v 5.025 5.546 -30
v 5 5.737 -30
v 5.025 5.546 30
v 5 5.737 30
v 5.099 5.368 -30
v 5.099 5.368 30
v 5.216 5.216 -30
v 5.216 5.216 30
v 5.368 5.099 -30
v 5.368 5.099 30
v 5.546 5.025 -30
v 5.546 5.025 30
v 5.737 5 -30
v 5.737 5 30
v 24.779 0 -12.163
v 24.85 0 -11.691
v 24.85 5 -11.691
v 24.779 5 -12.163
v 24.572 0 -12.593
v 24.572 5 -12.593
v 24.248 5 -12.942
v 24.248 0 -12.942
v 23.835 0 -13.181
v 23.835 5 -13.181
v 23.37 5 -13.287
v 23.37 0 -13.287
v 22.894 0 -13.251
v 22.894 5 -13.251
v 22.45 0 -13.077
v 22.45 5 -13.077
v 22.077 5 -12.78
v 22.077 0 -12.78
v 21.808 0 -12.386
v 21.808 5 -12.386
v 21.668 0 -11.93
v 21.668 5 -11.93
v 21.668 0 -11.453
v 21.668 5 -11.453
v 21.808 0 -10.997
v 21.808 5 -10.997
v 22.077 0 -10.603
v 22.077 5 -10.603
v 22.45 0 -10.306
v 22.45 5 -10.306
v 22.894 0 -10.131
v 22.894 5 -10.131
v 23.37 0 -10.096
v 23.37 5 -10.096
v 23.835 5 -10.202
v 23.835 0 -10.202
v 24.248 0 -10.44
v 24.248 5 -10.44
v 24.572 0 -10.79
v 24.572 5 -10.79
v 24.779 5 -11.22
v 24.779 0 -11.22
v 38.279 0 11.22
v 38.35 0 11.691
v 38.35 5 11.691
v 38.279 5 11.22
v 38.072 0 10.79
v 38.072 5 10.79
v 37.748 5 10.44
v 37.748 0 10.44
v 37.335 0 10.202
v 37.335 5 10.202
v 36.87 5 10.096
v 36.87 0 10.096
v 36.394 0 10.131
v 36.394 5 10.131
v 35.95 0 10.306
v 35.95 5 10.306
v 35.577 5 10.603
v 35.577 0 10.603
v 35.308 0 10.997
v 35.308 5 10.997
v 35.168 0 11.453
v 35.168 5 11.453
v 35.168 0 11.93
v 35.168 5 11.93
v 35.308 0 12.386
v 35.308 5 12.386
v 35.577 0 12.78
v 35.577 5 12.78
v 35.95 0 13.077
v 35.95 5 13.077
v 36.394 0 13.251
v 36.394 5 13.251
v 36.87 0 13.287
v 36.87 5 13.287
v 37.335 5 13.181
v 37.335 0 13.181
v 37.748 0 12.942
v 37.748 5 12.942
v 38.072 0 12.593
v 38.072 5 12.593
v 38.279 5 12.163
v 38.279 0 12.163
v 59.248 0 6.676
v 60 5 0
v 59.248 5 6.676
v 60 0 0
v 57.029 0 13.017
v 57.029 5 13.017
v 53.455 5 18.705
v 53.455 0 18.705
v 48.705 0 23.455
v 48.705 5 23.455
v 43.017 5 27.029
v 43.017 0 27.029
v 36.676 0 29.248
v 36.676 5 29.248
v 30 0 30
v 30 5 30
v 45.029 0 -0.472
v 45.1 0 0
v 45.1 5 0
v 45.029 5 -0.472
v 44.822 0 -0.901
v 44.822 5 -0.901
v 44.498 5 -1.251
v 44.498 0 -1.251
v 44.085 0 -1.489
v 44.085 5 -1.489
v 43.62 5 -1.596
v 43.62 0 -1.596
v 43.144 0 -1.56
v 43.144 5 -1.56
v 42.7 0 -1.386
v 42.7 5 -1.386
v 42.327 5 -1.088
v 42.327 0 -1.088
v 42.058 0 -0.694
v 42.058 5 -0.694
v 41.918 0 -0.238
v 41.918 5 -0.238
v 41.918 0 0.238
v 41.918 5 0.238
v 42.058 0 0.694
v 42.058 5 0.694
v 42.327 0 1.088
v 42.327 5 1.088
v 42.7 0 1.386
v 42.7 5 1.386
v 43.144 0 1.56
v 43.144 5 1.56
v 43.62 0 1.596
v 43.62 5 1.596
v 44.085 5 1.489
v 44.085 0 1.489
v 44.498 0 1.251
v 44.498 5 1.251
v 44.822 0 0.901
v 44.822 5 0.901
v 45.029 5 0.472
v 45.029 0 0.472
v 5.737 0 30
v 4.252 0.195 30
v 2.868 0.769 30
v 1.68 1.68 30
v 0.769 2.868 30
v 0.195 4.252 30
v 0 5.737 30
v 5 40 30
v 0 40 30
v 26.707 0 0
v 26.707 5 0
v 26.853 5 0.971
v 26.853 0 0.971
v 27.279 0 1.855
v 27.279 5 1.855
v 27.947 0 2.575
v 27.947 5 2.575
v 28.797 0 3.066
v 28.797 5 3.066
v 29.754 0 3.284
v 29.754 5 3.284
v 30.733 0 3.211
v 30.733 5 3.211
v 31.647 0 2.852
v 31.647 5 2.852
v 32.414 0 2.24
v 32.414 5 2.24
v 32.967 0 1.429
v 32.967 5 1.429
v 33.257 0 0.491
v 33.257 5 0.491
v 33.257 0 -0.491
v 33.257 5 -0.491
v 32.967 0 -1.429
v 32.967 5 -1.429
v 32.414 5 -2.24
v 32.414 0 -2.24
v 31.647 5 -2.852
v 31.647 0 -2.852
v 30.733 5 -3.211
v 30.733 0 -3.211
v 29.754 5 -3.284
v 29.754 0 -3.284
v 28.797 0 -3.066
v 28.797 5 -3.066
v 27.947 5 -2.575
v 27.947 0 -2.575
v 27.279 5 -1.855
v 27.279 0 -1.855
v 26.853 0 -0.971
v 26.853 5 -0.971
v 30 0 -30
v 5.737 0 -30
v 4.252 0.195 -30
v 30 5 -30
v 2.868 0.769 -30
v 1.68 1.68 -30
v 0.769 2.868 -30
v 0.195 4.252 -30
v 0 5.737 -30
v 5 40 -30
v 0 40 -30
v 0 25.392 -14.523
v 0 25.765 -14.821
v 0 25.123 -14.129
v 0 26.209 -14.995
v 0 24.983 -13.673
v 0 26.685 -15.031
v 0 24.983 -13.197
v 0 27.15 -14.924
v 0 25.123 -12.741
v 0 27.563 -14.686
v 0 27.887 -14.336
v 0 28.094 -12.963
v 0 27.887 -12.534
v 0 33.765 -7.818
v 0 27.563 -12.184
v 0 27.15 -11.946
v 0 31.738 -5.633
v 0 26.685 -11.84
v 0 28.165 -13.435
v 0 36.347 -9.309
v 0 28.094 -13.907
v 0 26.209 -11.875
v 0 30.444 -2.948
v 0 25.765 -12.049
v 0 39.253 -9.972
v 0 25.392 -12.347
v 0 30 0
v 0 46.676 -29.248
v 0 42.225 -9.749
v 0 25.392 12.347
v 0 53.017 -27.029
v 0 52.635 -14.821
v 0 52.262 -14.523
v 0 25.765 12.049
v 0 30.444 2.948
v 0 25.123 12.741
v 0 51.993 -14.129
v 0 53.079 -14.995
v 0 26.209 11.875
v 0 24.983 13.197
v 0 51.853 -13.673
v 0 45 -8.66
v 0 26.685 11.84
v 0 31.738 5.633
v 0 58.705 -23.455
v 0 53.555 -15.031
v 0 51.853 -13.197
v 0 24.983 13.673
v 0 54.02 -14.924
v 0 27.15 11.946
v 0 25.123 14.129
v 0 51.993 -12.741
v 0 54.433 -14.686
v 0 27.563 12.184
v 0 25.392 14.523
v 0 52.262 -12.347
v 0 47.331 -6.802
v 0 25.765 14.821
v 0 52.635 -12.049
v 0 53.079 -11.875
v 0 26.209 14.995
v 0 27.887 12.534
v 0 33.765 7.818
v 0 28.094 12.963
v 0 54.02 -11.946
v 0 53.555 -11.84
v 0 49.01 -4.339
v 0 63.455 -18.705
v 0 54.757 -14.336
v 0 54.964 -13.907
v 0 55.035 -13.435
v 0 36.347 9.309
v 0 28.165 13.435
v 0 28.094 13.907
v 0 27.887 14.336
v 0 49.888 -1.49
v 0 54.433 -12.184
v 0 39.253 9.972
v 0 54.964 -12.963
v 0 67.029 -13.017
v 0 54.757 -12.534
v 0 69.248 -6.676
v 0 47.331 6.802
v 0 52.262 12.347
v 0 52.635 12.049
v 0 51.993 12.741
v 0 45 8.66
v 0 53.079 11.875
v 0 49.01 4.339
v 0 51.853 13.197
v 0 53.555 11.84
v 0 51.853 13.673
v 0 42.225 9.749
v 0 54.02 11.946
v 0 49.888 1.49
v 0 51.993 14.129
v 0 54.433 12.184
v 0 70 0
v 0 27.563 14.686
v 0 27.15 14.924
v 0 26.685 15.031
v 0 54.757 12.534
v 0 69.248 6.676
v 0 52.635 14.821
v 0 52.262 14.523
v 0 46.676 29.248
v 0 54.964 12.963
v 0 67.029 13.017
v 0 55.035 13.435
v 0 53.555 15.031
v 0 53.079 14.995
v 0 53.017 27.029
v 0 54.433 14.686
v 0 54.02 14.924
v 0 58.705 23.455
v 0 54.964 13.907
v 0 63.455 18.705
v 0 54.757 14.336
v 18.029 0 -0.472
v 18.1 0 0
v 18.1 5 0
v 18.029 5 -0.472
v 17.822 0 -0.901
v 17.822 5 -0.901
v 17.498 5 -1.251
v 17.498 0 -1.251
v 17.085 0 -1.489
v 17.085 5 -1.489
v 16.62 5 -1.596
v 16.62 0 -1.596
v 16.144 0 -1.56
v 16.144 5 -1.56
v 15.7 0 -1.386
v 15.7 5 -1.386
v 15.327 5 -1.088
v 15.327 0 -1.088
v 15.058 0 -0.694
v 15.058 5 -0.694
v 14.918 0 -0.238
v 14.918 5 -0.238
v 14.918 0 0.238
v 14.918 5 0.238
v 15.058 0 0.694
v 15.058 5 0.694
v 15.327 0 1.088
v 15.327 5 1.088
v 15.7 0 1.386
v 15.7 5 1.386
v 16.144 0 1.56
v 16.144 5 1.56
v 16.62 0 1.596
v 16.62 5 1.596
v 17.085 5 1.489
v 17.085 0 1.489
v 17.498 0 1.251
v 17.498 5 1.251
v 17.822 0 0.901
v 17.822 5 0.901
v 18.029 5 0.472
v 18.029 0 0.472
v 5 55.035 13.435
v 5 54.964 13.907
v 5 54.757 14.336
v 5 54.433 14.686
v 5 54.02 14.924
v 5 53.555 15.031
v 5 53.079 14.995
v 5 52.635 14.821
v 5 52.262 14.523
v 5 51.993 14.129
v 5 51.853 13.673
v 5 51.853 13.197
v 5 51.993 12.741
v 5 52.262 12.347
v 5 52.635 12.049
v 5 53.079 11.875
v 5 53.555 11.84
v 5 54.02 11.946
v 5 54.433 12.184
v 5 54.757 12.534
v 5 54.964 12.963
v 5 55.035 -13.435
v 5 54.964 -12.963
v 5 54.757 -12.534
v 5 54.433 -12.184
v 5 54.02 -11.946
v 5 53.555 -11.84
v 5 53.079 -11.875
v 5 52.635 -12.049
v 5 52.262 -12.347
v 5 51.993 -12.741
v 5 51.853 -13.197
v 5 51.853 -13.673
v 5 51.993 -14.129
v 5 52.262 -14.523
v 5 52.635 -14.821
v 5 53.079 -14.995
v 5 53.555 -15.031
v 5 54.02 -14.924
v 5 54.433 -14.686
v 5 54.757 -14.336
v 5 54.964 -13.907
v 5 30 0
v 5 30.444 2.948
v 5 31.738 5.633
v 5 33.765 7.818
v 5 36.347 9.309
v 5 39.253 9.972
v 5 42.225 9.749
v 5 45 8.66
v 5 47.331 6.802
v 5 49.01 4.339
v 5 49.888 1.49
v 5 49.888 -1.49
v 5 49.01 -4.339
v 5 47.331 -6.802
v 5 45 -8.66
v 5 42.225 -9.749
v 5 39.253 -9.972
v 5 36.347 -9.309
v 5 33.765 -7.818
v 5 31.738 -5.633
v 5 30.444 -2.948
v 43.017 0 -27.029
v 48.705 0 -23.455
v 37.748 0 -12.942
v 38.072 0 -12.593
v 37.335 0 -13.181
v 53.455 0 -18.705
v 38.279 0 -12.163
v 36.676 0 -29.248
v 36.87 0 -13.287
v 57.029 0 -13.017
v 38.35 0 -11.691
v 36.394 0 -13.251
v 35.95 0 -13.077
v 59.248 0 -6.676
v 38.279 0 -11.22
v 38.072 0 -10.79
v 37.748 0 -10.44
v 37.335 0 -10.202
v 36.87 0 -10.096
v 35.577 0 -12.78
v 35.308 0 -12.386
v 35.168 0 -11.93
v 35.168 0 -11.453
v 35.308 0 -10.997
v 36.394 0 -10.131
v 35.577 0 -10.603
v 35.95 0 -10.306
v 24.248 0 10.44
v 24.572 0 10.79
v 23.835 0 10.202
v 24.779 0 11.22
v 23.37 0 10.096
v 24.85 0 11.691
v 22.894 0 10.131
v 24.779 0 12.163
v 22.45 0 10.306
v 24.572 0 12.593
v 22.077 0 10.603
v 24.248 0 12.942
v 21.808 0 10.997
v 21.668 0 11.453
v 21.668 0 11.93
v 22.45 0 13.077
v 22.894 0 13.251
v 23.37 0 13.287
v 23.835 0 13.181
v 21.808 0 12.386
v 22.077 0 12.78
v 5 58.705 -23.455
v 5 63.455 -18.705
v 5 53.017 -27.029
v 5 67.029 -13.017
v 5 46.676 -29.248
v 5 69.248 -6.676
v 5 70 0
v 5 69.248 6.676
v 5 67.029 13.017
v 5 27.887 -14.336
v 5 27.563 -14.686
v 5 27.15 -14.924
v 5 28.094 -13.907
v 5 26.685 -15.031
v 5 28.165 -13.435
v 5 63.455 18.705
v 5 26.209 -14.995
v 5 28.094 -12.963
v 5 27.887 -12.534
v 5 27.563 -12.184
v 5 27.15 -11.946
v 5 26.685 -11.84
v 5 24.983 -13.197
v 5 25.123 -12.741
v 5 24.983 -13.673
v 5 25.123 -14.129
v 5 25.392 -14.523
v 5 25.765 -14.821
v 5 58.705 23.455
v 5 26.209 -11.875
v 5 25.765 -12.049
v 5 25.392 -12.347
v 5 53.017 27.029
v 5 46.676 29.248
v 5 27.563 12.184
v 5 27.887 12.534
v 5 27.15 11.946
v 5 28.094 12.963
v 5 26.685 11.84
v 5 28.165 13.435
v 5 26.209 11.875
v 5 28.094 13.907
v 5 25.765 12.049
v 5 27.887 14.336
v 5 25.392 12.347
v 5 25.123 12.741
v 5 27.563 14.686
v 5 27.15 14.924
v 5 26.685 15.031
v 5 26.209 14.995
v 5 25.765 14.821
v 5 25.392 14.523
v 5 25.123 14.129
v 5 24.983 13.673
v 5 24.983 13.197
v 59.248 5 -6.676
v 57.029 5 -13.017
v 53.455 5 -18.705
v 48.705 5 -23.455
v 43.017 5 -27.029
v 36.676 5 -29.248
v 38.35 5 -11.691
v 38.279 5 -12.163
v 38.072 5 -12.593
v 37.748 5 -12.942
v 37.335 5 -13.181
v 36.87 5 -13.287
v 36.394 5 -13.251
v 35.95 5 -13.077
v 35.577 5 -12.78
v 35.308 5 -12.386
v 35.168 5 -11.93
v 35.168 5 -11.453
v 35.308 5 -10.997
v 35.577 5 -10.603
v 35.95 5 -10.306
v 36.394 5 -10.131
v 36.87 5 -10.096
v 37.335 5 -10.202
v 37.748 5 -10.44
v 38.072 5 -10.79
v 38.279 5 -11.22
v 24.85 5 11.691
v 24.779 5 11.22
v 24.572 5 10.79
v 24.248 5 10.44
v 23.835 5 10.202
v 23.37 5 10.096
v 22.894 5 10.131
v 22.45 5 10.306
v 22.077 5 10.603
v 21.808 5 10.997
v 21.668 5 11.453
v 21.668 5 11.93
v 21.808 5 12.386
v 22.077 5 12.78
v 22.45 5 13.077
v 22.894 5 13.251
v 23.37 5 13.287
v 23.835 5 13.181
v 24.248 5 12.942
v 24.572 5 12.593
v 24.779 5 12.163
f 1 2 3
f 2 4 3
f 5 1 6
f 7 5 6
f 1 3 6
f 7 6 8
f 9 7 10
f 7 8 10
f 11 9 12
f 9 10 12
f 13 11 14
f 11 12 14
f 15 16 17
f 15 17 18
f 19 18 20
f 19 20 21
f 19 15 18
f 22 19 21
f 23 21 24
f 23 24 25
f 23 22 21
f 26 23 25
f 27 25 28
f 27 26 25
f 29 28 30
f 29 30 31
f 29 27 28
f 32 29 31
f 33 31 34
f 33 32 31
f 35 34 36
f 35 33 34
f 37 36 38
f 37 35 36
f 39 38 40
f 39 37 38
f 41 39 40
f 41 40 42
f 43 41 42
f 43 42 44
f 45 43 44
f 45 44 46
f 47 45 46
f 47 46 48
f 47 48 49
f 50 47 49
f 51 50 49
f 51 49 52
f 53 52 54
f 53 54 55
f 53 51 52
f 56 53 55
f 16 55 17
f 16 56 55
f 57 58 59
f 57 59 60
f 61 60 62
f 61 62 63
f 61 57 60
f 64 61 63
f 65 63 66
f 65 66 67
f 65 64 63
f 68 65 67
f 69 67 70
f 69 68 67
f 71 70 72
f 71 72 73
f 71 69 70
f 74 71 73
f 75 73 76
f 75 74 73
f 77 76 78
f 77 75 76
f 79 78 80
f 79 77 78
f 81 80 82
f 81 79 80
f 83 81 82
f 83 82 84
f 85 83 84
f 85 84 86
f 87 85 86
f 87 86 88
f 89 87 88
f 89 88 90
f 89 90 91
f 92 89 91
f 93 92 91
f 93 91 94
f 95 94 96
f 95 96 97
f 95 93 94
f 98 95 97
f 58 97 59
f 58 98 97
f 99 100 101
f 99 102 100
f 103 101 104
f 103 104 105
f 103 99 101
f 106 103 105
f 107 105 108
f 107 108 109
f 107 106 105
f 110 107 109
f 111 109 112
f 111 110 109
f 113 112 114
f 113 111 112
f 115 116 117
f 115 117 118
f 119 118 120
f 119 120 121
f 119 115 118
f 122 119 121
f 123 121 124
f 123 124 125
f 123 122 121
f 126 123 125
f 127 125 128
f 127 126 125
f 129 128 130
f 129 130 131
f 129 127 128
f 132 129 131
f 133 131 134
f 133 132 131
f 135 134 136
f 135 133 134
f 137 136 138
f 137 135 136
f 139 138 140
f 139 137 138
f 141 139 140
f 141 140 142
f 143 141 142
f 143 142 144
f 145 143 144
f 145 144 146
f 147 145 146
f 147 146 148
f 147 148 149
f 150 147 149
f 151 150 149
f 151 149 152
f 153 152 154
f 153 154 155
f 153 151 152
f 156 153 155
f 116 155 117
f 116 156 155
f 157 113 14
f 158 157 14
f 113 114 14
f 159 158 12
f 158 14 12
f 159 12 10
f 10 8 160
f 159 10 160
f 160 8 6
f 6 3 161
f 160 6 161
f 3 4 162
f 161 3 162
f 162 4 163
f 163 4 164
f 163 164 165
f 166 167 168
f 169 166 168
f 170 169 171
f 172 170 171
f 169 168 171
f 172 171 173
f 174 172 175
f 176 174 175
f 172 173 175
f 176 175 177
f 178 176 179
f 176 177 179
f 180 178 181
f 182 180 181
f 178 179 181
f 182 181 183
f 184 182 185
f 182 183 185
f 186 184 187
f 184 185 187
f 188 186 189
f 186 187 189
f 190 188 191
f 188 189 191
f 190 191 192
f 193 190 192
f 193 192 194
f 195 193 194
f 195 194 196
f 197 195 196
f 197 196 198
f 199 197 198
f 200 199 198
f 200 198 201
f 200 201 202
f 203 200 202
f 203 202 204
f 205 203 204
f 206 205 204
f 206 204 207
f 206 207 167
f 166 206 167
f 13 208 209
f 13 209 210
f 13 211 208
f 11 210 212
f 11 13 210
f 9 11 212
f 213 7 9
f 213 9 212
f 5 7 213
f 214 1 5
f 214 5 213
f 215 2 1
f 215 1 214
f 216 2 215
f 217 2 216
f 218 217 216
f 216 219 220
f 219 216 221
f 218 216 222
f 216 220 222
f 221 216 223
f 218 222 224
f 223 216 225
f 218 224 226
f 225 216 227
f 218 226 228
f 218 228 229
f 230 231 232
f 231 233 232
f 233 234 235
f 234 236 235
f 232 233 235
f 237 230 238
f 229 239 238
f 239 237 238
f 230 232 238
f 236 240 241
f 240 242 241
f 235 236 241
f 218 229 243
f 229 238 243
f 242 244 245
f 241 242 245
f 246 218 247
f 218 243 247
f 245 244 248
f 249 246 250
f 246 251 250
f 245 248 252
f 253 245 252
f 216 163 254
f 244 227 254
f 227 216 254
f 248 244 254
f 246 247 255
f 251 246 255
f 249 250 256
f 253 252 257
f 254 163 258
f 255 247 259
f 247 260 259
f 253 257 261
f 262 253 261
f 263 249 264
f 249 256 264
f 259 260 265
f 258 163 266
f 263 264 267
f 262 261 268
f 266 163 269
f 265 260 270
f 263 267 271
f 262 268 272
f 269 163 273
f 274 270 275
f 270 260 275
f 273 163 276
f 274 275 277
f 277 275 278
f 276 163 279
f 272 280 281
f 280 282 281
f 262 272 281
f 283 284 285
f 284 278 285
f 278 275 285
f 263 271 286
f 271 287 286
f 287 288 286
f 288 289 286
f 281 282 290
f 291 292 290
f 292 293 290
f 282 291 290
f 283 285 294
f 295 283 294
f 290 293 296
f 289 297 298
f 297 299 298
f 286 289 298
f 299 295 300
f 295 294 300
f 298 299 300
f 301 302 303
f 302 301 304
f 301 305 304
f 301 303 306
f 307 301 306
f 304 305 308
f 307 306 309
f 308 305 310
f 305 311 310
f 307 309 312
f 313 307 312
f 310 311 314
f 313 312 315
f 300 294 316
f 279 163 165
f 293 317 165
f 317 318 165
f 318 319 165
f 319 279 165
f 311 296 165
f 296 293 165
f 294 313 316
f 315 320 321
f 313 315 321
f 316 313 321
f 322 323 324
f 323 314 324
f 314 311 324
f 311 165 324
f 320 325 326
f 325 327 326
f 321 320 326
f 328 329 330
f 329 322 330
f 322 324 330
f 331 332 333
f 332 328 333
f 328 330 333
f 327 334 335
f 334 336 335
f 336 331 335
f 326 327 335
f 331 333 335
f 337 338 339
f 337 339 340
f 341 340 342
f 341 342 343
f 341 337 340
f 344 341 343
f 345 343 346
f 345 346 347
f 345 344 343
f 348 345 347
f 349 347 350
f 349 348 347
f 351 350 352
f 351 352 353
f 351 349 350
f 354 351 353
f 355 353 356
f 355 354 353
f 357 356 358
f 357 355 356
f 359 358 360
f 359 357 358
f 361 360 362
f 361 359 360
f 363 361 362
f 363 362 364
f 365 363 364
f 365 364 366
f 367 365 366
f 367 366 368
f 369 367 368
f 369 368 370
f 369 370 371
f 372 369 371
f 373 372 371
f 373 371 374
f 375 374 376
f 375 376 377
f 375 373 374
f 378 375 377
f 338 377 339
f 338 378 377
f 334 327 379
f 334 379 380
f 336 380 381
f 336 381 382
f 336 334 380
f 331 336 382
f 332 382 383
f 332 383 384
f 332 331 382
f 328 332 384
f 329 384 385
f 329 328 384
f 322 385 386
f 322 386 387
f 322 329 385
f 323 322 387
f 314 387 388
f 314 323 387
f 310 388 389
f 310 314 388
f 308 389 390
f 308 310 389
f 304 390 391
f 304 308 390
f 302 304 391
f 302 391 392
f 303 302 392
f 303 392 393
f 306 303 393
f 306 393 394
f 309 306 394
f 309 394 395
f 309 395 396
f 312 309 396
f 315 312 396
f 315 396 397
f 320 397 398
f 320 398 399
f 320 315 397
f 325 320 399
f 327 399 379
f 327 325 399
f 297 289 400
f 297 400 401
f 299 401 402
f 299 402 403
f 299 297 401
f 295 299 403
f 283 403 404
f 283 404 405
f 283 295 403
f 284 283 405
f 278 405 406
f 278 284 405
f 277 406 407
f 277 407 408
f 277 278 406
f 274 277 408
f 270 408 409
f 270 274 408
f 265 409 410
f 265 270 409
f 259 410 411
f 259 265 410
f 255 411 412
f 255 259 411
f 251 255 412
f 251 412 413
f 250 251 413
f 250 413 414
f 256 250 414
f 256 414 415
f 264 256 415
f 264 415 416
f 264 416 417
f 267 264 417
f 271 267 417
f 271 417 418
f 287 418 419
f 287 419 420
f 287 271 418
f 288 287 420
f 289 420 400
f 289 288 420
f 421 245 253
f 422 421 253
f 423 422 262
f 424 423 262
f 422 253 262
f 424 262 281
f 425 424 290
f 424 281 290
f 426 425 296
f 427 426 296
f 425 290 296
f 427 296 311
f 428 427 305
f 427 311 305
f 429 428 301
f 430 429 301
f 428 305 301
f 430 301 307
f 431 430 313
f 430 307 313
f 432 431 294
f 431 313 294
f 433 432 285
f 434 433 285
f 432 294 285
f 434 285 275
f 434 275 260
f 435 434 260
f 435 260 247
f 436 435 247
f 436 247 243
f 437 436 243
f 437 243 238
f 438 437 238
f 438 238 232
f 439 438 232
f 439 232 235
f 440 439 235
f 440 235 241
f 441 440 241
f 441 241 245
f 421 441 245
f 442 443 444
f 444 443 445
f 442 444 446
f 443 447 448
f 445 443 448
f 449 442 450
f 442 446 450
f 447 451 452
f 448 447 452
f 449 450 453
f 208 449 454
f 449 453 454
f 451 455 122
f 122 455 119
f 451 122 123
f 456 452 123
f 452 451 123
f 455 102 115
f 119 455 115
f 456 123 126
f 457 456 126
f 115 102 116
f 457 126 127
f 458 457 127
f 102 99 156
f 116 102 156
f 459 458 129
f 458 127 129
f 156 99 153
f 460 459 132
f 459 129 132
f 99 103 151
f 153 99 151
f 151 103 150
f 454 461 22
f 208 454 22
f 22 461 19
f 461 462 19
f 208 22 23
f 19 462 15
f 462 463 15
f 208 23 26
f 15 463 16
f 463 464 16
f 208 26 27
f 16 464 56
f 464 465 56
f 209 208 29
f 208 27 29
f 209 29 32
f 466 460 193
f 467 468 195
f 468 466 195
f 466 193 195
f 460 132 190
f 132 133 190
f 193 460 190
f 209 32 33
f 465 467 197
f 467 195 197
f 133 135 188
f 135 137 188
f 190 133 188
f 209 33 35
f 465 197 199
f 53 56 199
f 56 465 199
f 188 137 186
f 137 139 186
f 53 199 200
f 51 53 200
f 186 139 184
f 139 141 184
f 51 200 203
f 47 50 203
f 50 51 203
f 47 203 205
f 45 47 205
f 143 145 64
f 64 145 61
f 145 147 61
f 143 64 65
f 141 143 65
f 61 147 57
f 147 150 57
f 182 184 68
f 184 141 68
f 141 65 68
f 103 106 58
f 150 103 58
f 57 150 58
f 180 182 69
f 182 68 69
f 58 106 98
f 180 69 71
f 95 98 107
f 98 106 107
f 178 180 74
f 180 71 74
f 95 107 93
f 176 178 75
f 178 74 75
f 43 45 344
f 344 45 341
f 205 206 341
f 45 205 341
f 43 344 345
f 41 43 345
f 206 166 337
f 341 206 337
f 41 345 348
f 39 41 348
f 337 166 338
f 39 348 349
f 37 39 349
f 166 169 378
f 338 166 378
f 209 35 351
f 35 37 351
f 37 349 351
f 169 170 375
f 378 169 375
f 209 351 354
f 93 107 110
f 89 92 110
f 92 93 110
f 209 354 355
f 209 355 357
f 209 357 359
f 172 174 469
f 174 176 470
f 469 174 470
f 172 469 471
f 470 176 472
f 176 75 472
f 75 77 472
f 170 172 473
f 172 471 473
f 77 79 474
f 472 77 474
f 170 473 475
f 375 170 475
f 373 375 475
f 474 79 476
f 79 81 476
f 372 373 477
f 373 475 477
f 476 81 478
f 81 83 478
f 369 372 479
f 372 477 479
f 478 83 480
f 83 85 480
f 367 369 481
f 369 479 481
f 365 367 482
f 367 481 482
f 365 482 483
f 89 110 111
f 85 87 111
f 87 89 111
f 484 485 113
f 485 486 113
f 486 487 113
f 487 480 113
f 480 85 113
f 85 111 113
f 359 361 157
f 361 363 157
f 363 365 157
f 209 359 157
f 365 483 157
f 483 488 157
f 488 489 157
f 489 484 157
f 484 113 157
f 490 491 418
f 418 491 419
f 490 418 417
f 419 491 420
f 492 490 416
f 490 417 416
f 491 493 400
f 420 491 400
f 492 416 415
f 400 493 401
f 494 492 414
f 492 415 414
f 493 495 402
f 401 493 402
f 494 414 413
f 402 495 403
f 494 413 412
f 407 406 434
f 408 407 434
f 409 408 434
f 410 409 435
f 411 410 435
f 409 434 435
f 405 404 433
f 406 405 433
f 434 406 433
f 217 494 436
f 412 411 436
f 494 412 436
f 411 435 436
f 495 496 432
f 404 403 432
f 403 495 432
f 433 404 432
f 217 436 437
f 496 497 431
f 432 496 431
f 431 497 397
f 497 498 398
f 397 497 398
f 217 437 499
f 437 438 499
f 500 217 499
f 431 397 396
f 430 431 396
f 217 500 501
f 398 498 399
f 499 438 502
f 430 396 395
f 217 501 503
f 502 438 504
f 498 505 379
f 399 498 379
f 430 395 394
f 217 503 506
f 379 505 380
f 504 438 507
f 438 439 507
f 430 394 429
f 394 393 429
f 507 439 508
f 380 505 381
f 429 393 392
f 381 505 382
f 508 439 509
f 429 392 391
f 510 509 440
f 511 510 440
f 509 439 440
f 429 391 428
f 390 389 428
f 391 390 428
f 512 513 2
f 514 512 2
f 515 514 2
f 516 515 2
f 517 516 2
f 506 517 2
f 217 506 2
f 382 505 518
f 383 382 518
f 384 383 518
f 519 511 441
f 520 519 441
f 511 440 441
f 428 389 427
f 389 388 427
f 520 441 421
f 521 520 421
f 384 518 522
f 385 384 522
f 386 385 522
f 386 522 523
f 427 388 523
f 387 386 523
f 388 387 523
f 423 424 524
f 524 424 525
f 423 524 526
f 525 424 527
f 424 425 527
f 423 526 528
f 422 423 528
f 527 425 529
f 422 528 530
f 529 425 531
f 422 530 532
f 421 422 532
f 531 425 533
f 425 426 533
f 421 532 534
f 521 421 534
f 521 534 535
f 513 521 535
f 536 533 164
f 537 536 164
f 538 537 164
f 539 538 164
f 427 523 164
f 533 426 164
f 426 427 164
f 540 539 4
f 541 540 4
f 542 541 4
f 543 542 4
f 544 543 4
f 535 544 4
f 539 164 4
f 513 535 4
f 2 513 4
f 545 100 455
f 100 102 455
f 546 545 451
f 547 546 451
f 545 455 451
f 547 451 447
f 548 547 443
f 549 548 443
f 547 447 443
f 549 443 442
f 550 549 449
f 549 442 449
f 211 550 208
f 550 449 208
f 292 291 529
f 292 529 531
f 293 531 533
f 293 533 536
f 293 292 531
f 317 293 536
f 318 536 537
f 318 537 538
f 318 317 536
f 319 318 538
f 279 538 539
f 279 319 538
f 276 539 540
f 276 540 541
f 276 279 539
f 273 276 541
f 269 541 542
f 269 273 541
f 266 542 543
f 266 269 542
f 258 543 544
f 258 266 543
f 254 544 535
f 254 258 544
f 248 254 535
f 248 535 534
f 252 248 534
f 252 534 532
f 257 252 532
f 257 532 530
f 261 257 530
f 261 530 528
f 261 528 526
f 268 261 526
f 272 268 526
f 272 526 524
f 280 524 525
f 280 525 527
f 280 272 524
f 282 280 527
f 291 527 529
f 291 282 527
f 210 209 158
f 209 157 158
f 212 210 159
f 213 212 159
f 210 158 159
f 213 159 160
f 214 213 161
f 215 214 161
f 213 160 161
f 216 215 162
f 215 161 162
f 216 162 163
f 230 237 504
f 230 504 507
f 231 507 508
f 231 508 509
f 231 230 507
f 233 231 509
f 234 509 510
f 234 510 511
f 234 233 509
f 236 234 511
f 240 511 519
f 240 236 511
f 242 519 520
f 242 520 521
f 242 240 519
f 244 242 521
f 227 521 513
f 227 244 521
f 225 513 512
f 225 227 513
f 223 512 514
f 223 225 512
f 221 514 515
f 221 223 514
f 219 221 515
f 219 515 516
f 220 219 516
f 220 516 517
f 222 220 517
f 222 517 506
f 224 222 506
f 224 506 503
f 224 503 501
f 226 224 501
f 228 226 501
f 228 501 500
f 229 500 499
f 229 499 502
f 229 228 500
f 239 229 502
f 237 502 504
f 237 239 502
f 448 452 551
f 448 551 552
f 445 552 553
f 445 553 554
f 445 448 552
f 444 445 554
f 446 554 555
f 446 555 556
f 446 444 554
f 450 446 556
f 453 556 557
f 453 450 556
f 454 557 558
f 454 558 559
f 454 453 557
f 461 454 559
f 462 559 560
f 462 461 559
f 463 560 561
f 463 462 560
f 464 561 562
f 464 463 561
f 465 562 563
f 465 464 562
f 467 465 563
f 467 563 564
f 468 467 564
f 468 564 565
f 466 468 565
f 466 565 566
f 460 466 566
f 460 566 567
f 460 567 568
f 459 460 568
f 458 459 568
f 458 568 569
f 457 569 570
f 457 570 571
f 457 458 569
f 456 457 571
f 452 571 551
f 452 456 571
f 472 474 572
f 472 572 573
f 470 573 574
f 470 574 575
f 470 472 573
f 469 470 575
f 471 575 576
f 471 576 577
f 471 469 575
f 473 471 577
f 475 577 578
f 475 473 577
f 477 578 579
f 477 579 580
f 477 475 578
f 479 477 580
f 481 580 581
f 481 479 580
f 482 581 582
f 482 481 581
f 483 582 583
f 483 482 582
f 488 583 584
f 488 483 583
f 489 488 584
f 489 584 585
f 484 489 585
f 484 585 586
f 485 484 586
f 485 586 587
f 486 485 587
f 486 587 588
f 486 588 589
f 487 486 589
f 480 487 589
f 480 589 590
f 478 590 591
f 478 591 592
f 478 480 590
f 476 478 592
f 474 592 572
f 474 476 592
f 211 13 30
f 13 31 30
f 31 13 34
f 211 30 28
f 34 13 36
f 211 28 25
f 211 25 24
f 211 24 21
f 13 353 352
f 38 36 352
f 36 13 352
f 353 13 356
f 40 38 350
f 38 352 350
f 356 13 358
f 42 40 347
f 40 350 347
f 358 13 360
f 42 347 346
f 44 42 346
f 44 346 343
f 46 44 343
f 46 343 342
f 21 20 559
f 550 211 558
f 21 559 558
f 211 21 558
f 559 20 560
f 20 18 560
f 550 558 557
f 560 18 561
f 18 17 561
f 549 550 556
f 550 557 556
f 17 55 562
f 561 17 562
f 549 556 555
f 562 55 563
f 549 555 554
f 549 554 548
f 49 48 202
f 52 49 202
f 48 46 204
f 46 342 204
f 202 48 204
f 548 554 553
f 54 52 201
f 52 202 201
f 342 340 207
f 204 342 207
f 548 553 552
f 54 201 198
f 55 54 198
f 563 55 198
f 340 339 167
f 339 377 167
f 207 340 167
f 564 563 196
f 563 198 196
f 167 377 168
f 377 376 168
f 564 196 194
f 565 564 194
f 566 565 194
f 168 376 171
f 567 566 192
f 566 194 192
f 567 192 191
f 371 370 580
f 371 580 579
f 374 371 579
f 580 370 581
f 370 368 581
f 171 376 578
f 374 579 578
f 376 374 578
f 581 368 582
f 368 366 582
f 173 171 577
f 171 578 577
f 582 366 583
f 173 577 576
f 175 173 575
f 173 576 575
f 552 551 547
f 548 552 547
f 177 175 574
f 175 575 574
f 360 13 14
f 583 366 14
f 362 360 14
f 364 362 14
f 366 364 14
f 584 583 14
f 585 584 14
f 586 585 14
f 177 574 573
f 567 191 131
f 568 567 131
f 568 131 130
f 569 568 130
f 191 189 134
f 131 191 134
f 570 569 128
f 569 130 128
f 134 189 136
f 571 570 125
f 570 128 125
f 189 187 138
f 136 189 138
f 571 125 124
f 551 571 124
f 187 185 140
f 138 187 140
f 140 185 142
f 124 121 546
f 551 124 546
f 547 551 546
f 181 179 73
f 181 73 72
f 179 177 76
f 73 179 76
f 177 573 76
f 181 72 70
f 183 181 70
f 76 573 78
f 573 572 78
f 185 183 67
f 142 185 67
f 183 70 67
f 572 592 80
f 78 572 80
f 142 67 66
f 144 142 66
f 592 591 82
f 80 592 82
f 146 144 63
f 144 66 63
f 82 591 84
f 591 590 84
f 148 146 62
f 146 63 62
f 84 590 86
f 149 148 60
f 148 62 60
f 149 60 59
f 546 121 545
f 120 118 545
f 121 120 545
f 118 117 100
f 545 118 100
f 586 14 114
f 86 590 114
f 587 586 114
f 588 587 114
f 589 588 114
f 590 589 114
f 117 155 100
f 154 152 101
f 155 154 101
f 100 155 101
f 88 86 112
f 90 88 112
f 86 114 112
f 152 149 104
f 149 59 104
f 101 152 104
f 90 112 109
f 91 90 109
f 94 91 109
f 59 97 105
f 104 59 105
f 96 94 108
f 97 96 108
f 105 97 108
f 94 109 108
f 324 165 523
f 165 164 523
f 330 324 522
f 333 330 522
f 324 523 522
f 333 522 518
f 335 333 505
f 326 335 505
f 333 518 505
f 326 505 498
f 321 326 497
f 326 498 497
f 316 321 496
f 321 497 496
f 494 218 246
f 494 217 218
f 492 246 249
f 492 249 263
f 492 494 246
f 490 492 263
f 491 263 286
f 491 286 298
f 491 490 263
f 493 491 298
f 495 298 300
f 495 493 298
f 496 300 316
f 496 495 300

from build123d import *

# Parameters (mm, degrees)
SM_BASE_FLANGE_1_DEPTH  = 30
SKETCH_2_R              = 3.293373228
CUT_EXTRUDE_1_DEPTH     = 10
HOLE_WIZARD_1_OUTLINE_R = 1.6
HOLE_WIZARD_1_DEPTH     = 5
SKETCH_5_R              = 10
CUT_EXTRUDE_2_DEPTH     = 10
HOLE_WIZARD_2_OUTLINE_R = 1.6
HOLE_WIZARD_2_DEPTH     = 5
FILLET_1_R              = 30


# Read off the part's stored shape, not the designer's step: 孔1, 孔2
# Sheet-metal steps are written as plain solids
with BuildPart() as part:
    # Sketch 1 → 基体-法兰1 (new, symmetric)
    with BuildSketch(Plane.XY):
        with BuildLine():
            Line((60, 0), (5.7366, 0))
            ThreePointArc((5.7366, 0), (1.680211239, 1.680211239), (0, 5.7366))
            Line((0, 5.7366), (0, 70))
            Line((0, 70), (5, 70))
            Line((5, 70), (5, 5.7366))
            ThreePointArc((5, 5.7366), (5.215745145, 5.215745145), (5.7366, 5))
            Line((5.7366, 5), (60, 5))
            Line((60, 5), (60, 0))
        make_face()
    extrude(amount=SM_BASE_FLANGE_1_DEPTH, both=True)

    # Sketch 2 → 切除-拉伸1 (cut)
    with BuildSketch(Plane(origin=(0, 5, 0), x_dir=(1, 0, 0), z_dir=(0, 1, 0))):
        with Locations(Location((30, 0, 0), (0, 0, 180))):
            Circle(SKETCH_2_R)
    extrude(amount=-CUT_EXTRUDE_1_DEPTH, mode=Mode.SUBTRACT)

    # 孔1 outline → 孔1 (cut)
    with BuildSketch(Plane(origin=(0, 0, 0), x_dir=(1, 0, 0), z_dir=(0, 1, 0))):
        with Locations((23.25, -11.691342951)):
            Circle(HOLE_WIZARD_1_OUTLINE_R)
        with Locations((16.5, 0)):
            Circle(HOLE_WIZARD_1_OUTLINE_R)
        with Locations((23.25, 11.691342951)):
            Circle(HOLE_WIZARD_1_OUTLINE_R)
        with Locations((36.75, 11.691342951)):
            Circle(HOLE_WIZARD_1_OUTLINE_R)
        with Locations((43.5, 0)):
            Circle(HOLE_WIZARD_1_OUTLINE_R)
        with Locations((36.75, -11.691342951)):
            Circle(HOLE_WIZARD_1_OUTLINE_R)
    extrude(amount=HOLE_WIZARD_1_DEPTH, mode=Mode.SUBTRACT)

    # 草图5 → 切除-拉伸2 (cut)
    with BuildSketch(Plane.ZY):
        with Locations(Location((0, 40, 0), (0, 0, 270))):
            Circle(SKETCH_5_R)
    extrude(amount=-CUT_EXTRUDE_2_DEPTH, mode=Mode.SUBTRACT)

    # 孔2 outline → 孔2 (cut)
    with BuildSketch(Plane.YZ):
        with Locations((26.564971157, 13.435028843)):
            Circle(HOLE_WIZARD_2_OUTLINE_R)
        with Locations((26.564971157, -13.435028843)):
            Circle(HOLE_WIZARD_2_OUTLINE_R)
        with Locations((53.435028843, -13.435028843)):
            Circle(HOLE_WIZARD_2_OUTLINE_R)
        with Locations((53.435028843, 13.435028843)):
            Circle(HOLE_WIZARD_2_OUTLINE_R)
    extrude(amount=HOLE_WIZARD_2_DEPTH, mode=Mode.SUBTRACT)

    # 圆角1
    fillet_1_edges = [part.edges().sort_by_distance(p)[0] for p in [
        (60, 2.5, -30),
        (60, 2.5, 30),
        (2.5, 70, -30),
        (2.5, 70, 30),
    ]]
    fillet(fillet_1_edges, radius=FILLET_1_R - 0.0001)  # a hair under: the kernel refuses the full size


solid = part.part
